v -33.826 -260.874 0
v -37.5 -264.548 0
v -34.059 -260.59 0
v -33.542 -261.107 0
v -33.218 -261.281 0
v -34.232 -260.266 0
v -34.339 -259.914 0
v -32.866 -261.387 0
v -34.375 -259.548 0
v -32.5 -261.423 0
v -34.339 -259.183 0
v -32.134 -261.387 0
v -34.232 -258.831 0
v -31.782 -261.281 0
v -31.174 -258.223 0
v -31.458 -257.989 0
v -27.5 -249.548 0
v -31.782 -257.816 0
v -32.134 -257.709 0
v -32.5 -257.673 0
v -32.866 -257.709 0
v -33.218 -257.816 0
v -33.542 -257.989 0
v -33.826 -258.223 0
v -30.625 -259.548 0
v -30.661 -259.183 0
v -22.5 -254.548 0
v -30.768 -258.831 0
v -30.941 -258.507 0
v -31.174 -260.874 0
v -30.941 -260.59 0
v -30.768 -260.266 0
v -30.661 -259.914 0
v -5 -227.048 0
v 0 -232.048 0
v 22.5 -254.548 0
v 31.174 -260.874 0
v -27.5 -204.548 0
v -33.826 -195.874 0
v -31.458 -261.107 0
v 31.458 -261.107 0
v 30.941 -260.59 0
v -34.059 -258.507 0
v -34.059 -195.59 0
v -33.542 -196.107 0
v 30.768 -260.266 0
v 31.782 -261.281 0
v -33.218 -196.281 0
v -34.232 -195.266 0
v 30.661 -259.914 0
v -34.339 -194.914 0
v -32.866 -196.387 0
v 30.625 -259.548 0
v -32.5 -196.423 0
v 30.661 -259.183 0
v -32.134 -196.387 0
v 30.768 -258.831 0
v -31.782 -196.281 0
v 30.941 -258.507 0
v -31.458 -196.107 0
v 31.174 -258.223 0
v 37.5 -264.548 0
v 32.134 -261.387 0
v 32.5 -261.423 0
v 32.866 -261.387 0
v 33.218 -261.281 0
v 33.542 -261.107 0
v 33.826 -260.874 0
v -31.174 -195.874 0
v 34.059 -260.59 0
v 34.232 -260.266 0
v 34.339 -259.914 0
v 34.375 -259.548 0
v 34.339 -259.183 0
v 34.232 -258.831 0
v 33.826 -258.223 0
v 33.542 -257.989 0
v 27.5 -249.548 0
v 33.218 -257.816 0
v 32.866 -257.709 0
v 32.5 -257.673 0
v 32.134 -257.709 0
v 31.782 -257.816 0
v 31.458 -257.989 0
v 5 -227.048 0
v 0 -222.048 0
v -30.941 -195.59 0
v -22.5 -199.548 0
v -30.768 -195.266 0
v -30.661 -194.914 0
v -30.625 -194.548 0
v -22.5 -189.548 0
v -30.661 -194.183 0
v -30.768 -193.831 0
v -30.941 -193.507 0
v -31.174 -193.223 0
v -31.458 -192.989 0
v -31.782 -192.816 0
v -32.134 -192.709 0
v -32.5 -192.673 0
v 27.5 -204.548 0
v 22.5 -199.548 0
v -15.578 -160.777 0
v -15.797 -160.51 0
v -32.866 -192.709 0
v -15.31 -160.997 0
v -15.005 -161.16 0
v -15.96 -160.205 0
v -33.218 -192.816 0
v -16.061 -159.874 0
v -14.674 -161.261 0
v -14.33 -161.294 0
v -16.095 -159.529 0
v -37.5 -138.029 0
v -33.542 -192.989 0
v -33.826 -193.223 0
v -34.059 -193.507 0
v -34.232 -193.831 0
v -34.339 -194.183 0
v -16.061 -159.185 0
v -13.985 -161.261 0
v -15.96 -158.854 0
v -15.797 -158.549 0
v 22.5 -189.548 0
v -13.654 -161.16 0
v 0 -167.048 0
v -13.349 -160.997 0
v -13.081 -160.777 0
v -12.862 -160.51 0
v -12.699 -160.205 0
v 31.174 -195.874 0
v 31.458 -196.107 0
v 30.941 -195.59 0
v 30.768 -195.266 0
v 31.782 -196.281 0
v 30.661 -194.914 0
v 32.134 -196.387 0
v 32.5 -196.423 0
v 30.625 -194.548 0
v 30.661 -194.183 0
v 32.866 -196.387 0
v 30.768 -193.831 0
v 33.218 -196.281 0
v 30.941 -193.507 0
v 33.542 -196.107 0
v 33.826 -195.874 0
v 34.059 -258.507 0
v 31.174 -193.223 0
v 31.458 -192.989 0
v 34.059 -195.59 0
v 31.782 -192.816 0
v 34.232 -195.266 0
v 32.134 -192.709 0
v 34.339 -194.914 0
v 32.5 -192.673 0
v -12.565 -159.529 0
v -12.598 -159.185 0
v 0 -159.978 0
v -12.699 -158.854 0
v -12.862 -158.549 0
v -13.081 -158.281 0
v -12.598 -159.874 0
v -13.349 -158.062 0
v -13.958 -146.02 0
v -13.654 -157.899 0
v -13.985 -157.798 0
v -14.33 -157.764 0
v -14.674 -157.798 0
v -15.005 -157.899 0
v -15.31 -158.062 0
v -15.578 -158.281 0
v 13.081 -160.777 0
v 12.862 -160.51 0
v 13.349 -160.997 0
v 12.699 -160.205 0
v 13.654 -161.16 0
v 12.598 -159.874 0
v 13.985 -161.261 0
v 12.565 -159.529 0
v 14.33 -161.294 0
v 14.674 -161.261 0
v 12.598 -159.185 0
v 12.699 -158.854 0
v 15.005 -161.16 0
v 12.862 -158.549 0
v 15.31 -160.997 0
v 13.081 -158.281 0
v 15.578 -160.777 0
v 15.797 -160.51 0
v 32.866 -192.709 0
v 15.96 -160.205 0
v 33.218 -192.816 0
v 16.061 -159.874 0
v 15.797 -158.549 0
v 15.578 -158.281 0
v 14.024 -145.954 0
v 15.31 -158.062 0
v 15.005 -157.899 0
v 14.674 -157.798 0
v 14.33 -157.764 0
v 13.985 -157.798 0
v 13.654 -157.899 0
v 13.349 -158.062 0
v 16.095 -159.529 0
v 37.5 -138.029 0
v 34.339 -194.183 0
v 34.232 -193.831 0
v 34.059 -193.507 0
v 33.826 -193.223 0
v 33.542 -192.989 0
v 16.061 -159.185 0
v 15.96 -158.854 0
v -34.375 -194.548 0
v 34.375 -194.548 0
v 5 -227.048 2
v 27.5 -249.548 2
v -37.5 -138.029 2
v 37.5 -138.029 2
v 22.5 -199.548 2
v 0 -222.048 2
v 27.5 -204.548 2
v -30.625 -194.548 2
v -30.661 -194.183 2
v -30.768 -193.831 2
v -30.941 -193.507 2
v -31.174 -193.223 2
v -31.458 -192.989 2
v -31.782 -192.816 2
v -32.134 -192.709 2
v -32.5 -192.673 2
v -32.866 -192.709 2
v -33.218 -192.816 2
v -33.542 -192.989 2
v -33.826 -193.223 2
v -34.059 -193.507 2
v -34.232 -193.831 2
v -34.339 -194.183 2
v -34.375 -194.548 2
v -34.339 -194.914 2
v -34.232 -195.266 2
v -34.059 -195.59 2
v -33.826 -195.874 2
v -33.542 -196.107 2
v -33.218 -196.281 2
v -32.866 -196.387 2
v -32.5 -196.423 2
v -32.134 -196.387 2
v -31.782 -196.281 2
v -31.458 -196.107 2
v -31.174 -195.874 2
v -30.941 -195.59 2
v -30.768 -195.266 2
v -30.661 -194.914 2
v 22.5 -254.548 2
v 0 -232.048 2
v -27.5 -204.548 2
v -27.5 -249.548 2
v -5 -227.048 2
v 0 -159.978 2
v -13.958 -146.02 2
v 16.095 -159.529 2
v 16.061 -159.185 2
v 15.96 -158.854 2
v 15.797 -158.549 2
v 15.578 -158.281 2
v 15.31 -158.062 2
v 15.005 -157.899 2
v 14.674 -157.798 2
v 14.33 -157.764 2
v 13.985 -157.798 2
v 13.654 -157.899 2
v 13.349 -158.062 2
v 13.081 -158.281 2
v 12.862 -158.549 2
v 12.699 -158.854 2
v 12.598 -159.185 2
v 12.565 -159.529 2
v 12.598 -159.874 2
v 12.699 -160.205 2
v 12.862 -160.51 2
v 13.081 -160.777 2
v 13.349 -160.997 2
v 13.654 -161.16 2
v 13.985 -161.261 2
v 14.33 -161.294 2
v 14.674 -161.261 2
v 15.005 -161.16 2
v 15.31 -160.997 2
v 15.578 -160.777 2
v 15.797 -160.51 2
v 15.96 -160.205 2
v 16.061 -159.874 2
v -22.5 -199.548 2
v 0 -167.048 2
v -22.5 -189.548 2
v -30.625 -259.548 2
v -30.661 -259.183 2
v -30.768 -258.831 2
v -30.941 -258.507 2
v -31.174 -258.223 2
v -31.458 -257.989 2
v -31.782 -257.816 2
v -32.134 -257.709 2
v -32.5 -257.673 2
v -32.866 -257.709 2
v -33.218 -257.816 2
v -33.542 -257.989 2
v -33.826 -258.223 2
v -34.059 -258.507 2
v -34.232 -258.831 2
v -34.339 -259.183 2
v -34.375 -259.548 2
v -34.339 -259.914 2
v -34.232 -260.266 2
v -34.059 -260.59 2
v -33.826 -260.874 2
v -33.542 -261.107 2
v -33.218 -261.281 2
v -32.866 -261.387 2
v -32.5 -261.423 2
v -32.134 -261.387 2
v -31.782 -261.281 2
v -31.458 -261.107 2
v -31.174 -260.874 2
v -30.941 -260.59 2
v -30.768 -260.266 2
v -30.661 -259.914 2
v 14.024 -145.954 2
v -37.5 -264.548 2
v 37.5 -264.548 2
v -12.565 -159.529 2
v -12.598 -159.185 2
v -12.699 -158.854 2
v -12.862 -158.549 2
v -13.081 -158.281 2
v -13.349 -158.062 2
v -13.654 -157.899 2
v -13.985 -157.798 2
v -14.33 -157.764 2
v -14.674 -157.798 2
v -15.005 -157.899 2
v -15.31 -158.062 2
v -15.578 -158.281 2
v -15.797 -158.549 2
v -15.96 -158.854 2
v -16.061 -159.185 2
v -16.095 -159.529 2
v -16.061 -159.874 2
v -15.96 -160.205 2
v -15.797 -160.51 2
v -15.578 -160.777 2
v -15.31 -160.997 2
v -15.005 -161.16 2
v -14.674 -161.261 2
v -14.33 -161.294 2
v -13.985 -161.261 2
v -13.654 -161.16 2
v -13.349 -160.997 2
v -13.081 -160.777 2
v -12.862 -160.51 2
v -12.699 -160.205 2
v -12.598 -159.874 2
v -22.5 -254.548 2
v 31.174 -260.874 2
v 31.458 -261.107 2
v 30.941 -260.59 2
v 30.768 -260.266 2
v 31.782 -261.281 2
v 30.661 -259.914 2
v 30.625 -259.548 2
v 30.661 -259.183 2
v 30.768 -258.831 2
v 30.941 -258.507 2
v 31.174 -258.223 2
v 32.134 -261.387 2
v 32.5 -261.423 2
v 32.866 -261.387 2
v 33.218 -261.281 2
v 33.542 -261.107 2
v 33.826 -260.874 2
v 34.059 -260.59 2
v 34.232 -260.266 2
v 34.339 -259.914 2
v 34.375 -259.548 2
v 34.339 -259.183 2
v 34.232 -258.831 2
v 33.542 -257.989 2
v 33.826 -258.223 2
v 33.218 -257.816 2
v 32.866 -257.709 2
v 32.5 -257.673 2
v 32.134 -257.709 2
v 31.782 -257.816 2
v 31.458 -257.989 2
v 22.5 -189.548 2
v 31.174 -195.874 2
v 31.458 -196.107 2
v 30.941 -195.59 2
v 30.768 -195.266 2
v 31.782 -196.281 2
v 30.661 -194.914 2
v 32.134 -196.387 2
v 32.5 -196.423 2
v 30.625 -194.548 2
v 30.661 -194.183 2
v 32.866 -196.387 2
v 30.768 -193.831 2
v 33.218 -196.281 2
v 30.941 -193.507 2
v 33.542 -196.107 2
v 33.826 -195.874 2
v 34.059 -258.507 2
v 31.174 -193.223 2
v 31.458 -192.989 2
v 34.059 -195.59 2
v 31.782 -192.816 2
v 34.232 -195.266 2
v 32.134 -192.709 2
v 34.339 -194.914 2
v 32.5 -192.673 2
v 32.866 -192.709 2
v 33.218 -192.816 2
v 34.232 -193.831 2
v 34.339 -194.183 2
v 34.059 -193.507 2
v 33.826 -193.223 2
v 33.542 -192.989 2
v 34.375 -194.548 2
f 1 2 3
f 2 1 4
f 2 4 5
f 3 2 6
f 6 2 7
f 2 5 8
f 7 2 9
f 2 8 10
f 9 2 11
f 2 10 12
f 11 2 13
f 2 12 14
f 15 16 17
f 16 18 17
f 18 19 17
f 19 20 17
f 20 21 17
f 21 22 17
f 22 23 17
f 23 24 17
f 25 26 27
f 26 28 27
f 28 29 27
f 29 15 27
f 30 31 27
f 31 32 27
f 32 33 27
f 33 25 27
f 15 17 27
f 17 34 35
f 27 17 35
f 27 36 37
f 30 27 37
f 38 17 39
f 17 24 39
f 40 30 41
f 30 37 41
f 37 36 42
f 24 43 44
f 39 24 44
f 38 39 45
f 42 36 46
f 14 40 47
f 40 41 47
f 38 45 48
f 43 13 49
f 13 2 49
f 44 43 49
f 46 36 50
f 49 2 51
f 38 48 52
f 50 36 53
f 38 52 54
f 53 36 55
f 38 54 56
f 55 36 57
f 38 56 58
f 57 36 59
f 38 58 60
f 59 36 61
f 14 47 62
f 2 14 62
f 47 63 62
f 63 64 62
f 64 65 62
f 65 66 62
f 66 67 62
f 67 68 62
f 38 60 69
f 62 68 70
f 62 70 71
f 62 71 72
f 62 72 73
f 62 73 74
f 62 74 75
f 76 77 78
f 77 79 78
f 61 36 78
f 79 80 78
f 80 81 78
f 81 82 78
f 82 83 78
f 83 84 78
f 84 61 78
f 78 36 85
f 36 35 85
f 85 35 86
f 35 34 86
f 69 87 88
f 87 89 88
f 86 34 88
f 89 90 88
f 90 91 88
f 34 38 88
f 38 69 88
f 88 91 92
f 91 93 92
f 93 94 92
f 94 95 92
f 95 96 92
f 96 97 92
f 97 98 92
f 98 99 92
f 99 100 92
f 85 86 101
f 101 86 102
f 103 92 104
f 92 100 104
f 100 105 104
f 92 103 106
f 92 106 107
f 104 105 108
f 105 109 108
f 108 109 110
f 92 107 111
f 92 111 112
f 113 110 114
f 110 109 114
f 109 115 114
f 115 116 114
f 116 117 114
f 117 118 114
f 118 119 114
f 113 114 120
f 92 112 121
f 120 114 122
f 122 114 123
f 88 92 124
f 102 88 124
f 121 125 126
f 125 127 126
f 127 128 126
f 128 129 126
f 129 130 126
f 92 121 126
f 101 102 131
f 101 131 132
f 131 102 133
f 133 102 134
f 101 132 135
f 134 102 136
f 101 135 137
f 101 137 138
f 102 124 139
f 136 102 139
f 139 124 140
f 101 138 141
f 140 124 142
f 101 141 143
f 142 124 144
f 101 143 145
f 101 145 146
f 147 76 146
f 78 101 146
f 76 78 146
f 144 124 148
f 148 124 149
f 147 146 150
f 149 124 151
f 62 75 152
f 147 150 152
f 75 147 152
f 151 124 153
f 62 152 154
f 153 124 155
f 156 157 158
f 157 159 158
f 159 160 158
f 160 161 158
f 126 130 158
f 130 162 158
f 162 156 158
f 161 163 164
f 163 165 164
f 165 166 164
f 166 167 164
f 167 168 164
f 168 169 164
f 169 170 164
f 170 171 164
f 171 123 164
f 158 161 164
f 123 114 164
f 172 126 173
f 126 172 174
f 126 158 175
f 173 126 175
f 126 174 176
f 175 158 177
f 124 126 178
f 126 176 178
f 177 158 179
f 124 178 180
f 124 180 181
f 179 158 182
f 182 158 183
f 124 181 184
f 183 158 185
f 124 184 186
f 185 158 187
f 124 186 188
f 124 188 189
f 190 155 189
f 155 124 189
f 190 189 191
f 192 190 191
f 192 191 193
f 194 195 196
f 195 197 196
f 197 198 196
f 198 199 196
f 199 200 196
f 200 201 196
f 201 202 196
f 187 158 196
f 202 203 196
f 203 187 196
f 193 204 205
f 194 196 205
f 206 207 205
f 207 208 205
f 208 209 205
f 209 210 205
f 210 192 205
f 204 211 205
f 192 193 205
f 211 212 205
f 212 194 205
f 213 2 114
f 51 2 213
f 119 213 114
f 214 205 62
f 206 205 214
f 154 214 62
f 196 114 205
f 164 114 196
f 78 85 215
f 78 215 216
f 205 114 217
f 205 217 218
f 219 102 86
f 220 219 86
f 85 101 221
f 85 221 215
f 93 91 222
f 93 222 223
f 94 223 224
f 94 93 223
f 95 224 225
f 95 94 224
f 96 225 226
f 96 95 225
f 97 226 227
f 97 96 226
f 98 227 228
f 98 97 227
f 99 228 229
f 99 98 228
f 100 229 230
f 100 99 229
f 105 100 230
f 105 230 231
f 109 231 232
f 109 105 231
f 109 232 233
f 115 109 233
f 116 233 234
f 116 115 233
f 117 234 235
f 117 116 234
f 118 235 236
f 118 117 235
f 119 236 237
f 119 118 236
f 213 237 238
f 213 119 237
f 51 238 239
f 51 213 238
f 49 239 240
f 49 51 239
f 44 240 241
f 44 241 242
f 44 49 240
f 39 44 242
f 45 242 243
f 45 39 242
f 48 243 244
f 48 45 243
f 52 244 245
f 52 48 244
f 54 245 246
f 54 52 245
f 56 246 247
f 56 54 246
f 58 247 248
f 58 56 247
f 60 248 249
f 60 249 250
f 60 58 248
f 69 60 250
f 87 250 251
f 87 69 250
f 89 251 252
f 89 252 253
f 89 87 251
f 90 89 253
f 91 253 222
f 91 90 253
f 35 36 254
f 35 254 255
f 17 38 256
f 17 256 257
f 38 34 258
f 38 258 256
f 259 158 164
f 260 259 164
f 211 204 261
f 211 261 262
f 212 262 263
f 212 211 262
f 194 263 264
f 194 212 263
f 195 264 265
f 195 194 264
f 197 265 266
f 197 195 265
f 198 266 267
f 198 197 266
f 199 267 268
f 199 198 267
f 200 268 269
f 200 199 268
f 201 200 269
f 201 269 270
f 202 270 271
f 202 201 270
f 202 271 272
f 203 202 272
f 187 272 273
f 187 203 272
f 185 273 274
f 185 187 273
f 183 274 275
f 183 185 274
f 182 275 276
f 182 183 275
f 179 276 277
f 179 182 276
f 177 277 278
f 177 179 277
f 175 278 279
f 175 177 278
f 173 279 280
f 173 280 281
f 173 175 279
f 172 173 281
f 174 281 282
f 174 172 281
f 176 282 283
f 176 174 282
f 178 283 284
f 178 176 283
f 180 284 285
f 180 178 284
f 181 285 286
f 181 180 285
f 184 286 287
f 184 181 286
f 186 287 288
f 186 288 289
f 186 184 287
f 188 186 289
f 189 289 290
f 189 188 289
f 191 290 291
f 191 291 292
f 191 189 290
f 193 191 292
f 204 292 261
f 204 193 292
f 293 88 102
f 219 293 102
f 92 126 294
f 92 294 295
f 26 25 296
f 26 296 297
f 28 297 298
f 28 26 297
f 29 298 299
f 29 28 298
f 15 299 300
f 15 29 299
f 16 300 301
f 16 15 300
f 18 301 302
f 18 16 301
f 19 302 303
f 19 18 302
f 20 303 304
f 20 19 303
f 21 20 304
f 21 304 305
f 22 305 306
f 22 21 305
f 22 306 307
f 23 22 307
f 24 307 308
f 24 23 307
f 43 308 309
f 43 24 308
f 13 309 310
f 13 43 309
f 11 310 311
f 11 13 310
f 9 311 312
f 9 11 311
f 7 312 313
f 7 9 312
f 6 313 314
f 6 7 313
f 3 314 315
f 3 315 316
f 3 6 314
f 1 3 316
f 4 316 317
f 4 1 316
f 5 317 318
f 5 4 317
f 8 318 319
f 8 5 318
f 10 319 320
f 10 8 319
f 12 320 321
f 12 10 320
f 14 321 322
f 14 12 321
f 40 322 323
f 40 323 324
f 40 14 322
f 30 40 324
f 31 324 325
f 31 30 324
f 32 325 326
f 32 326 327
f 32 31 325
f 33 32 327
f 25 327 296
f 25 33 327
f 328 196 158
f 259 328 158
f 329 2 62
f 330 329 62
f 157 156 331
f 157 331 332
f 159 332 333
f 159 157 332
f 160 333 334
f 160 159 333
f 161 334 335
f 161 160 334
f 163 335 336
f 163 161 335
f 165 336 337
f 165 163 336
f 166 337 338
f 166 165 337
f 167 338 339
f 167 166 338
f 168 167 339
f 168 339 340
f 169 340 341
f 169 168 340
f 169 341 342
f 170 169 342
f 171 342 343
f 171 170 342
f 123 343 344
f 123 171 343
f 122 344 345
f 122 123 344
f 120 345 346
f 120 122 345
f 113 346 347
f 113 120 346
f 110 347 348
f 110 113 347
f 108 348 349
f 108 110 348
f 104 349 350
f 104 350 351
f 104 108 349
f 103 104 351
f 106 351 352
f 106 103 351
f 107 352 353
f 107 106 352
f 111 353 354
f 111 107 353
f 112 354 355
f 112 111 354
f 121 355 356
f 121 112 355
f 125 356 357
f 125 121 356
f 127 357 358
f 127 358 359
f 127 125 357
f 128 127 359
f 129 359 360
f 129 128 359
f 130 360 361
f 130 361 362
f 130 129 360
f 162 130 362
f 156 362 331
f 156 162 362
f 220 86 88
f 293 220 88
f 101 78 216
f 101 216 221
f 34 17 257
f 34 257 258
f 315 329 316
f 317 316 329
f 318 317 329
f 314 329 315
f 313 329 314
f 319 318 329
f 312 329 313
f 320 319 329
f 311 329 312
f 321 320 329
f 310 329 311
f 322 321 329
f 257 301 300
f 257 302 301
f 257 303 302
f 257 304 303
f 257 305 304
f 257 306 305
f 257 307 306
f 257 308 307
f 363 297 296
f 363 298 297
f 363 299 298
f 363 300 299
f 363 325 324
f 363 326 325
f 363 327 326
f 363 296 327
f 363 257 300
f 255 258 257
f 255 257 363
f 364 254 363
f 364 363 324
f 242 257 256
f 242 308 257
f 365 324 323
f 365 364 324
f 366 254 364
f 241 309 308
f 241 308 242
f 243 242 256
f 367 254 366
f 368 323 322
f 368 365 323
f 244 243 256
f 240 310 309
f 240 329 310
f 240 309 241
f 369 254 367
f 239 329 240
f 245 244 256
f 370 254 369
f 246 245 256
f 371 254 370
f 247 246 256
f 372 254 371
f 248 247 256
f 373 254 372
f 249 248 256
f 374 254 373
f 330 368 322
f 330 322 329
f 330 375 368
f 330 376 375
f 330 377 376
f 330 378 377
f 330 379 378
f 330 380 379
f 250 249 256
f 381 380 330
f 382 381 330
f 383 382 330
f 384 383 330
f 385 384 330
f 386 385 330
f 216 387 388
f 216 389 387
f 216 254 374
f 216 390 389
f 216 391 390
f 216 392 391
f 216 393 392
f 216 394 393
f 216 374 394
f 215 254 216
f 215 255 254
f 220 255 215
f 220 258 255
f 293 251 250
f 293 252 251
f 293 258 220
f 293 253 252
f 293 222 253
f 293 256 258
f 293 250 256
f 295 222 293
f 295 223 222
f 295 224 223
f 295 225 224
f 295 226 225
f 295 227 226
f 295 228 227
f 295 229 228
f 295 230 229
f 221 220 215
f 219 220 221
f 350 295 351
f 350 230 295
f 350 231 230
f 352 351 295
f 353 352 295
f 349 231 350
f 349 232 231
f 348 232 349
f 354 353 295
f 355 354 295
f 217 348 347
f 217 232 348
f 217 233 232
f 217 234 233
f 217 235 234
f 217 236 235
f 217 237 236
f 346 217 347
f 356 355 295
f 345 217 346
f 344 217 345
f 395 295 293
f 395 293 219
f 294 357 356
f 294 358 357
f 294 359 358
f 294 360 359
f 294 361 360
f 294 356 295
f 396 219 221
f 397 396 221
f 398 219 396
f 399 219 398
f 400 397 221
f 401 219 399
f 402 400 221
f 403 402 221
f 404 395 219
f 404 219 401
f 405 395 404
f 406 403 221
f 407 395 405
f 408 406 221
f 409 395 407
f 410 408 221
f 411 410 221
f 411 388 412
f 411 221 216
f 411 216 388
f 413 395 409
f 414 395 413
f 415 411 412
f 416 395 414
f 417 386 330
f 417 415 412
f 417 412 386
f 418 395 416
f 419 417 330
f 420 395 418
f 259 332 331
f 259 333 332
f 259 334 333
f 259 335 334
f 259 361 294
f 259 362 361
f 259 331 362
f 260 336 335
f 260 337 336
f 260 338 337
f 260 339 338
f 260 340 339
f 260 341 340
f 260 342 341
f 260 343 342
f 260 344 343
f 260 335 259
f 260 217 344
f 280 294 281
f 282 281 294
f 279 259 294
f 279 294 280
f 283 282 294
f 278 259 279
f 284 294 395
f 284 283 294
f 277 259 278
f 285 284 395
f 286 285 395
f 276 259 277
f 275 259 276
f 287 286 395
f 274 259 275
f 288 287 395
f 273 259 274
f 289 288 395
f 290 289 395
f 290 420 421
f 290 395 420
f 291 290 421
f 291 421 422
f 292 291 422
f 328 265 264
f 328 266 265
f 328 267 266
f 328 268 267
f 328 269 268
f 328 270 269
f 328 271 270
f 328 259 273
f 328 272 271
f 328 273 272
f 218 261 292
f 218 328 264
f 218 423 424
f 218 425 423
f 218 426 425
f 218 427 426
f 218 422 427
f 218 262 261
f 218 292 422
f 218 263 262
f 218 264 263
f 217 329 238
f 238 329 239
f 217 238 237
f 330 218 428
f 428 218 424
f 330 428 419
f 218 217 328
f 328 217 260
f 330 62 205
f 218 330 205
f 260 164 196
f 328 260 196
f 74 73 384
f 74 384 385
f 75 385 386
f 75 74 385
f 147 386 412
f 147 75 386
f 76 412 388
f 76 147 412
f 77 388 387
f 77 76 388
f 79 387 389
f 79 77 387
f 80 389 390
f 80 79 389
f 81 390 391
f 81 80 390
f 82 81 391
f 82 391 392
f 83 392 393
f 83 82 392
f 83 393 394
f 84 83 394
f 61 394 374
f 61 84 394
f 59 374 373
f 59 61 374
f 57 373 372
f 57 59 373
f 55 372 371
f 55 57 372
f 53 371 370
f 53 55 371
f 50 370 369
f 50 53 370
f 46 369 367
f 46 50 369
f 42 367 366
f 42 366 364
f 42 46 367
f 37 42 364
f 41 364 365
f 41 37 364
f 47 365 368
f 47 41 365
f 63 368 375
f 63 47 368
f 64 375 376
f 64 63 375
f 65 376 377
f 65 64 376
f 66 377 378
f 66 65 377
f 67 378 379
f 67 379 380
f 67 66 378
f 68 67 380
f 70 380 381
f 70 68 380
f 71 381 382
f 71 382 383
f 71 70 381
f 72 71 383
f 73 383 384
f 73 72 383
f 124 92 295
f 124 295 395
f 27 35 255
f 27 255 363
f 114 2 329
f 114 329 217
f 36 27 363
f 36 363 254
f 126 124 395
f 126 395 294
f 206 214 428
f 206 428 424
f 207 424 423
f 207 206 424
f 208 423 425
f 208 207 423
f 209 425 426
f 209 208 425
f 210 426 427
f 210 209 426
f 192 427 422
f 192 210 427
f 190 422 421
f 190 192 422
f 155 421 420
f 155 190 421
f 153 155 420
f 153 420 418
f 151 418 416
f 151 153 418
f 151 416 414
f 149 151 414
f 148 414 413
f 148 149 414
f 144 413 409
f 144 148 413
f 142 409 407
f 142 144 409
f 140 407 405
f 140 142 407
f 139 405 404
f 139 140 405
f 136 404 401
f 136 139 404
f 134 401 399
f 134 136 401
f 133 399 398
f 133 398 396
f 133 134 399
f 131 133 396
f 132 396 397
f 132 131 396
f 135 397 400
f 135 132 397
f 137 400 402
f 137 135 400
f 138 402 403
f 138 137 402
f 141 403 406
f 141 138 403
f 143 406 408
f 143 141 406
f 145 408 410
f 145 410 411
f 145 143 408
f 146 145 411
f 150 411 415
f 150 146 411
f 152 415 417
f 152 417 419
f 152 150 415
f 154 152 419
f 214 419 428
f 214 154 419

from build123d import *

# Parameters (mm, degrees)
SKETCH1_W           = 75
SKETCH1_H           = 126.51894577
SKETCH1_R           = 1.875
SKETCH1_R_2         = 1.765
BOSS_EXTRUDE2_DEPTH = 2


with BuildPart() as part:
    # Sketch1 → Boss-Extrude2 (new body)
    with BuildSketch(Plane.XY):
        with Locations((0, -201.288893998)):
            Rectangle(SKETCH1_W, SKETCH1_H)
        with Locations((32.5, -259.548366883)):
            Circle(SKETCH1_R, mode=Mode.SUBTRACT)
        with Locations((-32.5, -259.548366883)):
            Circle(SKETCH1_R, mode=Mode.SUBTRACT)
        with Locations((-32.5, -194.548366883)):
            Circle(SKETCH1_R, mode=Mode.SUBTRACT)
        with Locations((32.5, -194.548366883)):
            Circle(SKETCH1_R, mode=Mode.SUBTRACT)
        with Locations((14.329505719, -159.529421113)):
            Circle(SKETCH1_R_2, mode=Mode.SUBTRACT)
        with Locations((-14.329505719, -159.529421113)):
            Circle(SKETCH1_R_2, mode=Mode.SUBTRACT)
        Polygon((-27.5, -204.548366883), (-27.5, -249.548366883), (-5, -227.048366883), align=None, mode=Mode.SUBTRACT)
        Polygon((-22.5, -254.548366883), (22.5, -254.548366883), (0, -232.048366883), align=None, mode=Mode.SUBTRACT)
        Polygon((27.5, -249.548366883), (27.5, -204.548366883), (5, -227.048366883), align=None, mode=Mode.SUBTRACT)
        Polygon((-22.5, -199.548366883), (22.5, -199.548366883), (0, -222.048366883), align=None, mode=Mode.SUBTRACT)
        Polygon((-22.5, -189.548366883), (22.5, -189.548366883), (0, -167.048366883), align=None, mode=Mode.SUBTRACT)
        Polygon((14.024331064, -145.954035819), (0, -159.978366883), (-13.95827912, -146.020087763), align=None, mode=Mode.SUBTRACT)
    extrude(amount=BOSS_EXTRUDE2_DEPTH)


solid = part.part
